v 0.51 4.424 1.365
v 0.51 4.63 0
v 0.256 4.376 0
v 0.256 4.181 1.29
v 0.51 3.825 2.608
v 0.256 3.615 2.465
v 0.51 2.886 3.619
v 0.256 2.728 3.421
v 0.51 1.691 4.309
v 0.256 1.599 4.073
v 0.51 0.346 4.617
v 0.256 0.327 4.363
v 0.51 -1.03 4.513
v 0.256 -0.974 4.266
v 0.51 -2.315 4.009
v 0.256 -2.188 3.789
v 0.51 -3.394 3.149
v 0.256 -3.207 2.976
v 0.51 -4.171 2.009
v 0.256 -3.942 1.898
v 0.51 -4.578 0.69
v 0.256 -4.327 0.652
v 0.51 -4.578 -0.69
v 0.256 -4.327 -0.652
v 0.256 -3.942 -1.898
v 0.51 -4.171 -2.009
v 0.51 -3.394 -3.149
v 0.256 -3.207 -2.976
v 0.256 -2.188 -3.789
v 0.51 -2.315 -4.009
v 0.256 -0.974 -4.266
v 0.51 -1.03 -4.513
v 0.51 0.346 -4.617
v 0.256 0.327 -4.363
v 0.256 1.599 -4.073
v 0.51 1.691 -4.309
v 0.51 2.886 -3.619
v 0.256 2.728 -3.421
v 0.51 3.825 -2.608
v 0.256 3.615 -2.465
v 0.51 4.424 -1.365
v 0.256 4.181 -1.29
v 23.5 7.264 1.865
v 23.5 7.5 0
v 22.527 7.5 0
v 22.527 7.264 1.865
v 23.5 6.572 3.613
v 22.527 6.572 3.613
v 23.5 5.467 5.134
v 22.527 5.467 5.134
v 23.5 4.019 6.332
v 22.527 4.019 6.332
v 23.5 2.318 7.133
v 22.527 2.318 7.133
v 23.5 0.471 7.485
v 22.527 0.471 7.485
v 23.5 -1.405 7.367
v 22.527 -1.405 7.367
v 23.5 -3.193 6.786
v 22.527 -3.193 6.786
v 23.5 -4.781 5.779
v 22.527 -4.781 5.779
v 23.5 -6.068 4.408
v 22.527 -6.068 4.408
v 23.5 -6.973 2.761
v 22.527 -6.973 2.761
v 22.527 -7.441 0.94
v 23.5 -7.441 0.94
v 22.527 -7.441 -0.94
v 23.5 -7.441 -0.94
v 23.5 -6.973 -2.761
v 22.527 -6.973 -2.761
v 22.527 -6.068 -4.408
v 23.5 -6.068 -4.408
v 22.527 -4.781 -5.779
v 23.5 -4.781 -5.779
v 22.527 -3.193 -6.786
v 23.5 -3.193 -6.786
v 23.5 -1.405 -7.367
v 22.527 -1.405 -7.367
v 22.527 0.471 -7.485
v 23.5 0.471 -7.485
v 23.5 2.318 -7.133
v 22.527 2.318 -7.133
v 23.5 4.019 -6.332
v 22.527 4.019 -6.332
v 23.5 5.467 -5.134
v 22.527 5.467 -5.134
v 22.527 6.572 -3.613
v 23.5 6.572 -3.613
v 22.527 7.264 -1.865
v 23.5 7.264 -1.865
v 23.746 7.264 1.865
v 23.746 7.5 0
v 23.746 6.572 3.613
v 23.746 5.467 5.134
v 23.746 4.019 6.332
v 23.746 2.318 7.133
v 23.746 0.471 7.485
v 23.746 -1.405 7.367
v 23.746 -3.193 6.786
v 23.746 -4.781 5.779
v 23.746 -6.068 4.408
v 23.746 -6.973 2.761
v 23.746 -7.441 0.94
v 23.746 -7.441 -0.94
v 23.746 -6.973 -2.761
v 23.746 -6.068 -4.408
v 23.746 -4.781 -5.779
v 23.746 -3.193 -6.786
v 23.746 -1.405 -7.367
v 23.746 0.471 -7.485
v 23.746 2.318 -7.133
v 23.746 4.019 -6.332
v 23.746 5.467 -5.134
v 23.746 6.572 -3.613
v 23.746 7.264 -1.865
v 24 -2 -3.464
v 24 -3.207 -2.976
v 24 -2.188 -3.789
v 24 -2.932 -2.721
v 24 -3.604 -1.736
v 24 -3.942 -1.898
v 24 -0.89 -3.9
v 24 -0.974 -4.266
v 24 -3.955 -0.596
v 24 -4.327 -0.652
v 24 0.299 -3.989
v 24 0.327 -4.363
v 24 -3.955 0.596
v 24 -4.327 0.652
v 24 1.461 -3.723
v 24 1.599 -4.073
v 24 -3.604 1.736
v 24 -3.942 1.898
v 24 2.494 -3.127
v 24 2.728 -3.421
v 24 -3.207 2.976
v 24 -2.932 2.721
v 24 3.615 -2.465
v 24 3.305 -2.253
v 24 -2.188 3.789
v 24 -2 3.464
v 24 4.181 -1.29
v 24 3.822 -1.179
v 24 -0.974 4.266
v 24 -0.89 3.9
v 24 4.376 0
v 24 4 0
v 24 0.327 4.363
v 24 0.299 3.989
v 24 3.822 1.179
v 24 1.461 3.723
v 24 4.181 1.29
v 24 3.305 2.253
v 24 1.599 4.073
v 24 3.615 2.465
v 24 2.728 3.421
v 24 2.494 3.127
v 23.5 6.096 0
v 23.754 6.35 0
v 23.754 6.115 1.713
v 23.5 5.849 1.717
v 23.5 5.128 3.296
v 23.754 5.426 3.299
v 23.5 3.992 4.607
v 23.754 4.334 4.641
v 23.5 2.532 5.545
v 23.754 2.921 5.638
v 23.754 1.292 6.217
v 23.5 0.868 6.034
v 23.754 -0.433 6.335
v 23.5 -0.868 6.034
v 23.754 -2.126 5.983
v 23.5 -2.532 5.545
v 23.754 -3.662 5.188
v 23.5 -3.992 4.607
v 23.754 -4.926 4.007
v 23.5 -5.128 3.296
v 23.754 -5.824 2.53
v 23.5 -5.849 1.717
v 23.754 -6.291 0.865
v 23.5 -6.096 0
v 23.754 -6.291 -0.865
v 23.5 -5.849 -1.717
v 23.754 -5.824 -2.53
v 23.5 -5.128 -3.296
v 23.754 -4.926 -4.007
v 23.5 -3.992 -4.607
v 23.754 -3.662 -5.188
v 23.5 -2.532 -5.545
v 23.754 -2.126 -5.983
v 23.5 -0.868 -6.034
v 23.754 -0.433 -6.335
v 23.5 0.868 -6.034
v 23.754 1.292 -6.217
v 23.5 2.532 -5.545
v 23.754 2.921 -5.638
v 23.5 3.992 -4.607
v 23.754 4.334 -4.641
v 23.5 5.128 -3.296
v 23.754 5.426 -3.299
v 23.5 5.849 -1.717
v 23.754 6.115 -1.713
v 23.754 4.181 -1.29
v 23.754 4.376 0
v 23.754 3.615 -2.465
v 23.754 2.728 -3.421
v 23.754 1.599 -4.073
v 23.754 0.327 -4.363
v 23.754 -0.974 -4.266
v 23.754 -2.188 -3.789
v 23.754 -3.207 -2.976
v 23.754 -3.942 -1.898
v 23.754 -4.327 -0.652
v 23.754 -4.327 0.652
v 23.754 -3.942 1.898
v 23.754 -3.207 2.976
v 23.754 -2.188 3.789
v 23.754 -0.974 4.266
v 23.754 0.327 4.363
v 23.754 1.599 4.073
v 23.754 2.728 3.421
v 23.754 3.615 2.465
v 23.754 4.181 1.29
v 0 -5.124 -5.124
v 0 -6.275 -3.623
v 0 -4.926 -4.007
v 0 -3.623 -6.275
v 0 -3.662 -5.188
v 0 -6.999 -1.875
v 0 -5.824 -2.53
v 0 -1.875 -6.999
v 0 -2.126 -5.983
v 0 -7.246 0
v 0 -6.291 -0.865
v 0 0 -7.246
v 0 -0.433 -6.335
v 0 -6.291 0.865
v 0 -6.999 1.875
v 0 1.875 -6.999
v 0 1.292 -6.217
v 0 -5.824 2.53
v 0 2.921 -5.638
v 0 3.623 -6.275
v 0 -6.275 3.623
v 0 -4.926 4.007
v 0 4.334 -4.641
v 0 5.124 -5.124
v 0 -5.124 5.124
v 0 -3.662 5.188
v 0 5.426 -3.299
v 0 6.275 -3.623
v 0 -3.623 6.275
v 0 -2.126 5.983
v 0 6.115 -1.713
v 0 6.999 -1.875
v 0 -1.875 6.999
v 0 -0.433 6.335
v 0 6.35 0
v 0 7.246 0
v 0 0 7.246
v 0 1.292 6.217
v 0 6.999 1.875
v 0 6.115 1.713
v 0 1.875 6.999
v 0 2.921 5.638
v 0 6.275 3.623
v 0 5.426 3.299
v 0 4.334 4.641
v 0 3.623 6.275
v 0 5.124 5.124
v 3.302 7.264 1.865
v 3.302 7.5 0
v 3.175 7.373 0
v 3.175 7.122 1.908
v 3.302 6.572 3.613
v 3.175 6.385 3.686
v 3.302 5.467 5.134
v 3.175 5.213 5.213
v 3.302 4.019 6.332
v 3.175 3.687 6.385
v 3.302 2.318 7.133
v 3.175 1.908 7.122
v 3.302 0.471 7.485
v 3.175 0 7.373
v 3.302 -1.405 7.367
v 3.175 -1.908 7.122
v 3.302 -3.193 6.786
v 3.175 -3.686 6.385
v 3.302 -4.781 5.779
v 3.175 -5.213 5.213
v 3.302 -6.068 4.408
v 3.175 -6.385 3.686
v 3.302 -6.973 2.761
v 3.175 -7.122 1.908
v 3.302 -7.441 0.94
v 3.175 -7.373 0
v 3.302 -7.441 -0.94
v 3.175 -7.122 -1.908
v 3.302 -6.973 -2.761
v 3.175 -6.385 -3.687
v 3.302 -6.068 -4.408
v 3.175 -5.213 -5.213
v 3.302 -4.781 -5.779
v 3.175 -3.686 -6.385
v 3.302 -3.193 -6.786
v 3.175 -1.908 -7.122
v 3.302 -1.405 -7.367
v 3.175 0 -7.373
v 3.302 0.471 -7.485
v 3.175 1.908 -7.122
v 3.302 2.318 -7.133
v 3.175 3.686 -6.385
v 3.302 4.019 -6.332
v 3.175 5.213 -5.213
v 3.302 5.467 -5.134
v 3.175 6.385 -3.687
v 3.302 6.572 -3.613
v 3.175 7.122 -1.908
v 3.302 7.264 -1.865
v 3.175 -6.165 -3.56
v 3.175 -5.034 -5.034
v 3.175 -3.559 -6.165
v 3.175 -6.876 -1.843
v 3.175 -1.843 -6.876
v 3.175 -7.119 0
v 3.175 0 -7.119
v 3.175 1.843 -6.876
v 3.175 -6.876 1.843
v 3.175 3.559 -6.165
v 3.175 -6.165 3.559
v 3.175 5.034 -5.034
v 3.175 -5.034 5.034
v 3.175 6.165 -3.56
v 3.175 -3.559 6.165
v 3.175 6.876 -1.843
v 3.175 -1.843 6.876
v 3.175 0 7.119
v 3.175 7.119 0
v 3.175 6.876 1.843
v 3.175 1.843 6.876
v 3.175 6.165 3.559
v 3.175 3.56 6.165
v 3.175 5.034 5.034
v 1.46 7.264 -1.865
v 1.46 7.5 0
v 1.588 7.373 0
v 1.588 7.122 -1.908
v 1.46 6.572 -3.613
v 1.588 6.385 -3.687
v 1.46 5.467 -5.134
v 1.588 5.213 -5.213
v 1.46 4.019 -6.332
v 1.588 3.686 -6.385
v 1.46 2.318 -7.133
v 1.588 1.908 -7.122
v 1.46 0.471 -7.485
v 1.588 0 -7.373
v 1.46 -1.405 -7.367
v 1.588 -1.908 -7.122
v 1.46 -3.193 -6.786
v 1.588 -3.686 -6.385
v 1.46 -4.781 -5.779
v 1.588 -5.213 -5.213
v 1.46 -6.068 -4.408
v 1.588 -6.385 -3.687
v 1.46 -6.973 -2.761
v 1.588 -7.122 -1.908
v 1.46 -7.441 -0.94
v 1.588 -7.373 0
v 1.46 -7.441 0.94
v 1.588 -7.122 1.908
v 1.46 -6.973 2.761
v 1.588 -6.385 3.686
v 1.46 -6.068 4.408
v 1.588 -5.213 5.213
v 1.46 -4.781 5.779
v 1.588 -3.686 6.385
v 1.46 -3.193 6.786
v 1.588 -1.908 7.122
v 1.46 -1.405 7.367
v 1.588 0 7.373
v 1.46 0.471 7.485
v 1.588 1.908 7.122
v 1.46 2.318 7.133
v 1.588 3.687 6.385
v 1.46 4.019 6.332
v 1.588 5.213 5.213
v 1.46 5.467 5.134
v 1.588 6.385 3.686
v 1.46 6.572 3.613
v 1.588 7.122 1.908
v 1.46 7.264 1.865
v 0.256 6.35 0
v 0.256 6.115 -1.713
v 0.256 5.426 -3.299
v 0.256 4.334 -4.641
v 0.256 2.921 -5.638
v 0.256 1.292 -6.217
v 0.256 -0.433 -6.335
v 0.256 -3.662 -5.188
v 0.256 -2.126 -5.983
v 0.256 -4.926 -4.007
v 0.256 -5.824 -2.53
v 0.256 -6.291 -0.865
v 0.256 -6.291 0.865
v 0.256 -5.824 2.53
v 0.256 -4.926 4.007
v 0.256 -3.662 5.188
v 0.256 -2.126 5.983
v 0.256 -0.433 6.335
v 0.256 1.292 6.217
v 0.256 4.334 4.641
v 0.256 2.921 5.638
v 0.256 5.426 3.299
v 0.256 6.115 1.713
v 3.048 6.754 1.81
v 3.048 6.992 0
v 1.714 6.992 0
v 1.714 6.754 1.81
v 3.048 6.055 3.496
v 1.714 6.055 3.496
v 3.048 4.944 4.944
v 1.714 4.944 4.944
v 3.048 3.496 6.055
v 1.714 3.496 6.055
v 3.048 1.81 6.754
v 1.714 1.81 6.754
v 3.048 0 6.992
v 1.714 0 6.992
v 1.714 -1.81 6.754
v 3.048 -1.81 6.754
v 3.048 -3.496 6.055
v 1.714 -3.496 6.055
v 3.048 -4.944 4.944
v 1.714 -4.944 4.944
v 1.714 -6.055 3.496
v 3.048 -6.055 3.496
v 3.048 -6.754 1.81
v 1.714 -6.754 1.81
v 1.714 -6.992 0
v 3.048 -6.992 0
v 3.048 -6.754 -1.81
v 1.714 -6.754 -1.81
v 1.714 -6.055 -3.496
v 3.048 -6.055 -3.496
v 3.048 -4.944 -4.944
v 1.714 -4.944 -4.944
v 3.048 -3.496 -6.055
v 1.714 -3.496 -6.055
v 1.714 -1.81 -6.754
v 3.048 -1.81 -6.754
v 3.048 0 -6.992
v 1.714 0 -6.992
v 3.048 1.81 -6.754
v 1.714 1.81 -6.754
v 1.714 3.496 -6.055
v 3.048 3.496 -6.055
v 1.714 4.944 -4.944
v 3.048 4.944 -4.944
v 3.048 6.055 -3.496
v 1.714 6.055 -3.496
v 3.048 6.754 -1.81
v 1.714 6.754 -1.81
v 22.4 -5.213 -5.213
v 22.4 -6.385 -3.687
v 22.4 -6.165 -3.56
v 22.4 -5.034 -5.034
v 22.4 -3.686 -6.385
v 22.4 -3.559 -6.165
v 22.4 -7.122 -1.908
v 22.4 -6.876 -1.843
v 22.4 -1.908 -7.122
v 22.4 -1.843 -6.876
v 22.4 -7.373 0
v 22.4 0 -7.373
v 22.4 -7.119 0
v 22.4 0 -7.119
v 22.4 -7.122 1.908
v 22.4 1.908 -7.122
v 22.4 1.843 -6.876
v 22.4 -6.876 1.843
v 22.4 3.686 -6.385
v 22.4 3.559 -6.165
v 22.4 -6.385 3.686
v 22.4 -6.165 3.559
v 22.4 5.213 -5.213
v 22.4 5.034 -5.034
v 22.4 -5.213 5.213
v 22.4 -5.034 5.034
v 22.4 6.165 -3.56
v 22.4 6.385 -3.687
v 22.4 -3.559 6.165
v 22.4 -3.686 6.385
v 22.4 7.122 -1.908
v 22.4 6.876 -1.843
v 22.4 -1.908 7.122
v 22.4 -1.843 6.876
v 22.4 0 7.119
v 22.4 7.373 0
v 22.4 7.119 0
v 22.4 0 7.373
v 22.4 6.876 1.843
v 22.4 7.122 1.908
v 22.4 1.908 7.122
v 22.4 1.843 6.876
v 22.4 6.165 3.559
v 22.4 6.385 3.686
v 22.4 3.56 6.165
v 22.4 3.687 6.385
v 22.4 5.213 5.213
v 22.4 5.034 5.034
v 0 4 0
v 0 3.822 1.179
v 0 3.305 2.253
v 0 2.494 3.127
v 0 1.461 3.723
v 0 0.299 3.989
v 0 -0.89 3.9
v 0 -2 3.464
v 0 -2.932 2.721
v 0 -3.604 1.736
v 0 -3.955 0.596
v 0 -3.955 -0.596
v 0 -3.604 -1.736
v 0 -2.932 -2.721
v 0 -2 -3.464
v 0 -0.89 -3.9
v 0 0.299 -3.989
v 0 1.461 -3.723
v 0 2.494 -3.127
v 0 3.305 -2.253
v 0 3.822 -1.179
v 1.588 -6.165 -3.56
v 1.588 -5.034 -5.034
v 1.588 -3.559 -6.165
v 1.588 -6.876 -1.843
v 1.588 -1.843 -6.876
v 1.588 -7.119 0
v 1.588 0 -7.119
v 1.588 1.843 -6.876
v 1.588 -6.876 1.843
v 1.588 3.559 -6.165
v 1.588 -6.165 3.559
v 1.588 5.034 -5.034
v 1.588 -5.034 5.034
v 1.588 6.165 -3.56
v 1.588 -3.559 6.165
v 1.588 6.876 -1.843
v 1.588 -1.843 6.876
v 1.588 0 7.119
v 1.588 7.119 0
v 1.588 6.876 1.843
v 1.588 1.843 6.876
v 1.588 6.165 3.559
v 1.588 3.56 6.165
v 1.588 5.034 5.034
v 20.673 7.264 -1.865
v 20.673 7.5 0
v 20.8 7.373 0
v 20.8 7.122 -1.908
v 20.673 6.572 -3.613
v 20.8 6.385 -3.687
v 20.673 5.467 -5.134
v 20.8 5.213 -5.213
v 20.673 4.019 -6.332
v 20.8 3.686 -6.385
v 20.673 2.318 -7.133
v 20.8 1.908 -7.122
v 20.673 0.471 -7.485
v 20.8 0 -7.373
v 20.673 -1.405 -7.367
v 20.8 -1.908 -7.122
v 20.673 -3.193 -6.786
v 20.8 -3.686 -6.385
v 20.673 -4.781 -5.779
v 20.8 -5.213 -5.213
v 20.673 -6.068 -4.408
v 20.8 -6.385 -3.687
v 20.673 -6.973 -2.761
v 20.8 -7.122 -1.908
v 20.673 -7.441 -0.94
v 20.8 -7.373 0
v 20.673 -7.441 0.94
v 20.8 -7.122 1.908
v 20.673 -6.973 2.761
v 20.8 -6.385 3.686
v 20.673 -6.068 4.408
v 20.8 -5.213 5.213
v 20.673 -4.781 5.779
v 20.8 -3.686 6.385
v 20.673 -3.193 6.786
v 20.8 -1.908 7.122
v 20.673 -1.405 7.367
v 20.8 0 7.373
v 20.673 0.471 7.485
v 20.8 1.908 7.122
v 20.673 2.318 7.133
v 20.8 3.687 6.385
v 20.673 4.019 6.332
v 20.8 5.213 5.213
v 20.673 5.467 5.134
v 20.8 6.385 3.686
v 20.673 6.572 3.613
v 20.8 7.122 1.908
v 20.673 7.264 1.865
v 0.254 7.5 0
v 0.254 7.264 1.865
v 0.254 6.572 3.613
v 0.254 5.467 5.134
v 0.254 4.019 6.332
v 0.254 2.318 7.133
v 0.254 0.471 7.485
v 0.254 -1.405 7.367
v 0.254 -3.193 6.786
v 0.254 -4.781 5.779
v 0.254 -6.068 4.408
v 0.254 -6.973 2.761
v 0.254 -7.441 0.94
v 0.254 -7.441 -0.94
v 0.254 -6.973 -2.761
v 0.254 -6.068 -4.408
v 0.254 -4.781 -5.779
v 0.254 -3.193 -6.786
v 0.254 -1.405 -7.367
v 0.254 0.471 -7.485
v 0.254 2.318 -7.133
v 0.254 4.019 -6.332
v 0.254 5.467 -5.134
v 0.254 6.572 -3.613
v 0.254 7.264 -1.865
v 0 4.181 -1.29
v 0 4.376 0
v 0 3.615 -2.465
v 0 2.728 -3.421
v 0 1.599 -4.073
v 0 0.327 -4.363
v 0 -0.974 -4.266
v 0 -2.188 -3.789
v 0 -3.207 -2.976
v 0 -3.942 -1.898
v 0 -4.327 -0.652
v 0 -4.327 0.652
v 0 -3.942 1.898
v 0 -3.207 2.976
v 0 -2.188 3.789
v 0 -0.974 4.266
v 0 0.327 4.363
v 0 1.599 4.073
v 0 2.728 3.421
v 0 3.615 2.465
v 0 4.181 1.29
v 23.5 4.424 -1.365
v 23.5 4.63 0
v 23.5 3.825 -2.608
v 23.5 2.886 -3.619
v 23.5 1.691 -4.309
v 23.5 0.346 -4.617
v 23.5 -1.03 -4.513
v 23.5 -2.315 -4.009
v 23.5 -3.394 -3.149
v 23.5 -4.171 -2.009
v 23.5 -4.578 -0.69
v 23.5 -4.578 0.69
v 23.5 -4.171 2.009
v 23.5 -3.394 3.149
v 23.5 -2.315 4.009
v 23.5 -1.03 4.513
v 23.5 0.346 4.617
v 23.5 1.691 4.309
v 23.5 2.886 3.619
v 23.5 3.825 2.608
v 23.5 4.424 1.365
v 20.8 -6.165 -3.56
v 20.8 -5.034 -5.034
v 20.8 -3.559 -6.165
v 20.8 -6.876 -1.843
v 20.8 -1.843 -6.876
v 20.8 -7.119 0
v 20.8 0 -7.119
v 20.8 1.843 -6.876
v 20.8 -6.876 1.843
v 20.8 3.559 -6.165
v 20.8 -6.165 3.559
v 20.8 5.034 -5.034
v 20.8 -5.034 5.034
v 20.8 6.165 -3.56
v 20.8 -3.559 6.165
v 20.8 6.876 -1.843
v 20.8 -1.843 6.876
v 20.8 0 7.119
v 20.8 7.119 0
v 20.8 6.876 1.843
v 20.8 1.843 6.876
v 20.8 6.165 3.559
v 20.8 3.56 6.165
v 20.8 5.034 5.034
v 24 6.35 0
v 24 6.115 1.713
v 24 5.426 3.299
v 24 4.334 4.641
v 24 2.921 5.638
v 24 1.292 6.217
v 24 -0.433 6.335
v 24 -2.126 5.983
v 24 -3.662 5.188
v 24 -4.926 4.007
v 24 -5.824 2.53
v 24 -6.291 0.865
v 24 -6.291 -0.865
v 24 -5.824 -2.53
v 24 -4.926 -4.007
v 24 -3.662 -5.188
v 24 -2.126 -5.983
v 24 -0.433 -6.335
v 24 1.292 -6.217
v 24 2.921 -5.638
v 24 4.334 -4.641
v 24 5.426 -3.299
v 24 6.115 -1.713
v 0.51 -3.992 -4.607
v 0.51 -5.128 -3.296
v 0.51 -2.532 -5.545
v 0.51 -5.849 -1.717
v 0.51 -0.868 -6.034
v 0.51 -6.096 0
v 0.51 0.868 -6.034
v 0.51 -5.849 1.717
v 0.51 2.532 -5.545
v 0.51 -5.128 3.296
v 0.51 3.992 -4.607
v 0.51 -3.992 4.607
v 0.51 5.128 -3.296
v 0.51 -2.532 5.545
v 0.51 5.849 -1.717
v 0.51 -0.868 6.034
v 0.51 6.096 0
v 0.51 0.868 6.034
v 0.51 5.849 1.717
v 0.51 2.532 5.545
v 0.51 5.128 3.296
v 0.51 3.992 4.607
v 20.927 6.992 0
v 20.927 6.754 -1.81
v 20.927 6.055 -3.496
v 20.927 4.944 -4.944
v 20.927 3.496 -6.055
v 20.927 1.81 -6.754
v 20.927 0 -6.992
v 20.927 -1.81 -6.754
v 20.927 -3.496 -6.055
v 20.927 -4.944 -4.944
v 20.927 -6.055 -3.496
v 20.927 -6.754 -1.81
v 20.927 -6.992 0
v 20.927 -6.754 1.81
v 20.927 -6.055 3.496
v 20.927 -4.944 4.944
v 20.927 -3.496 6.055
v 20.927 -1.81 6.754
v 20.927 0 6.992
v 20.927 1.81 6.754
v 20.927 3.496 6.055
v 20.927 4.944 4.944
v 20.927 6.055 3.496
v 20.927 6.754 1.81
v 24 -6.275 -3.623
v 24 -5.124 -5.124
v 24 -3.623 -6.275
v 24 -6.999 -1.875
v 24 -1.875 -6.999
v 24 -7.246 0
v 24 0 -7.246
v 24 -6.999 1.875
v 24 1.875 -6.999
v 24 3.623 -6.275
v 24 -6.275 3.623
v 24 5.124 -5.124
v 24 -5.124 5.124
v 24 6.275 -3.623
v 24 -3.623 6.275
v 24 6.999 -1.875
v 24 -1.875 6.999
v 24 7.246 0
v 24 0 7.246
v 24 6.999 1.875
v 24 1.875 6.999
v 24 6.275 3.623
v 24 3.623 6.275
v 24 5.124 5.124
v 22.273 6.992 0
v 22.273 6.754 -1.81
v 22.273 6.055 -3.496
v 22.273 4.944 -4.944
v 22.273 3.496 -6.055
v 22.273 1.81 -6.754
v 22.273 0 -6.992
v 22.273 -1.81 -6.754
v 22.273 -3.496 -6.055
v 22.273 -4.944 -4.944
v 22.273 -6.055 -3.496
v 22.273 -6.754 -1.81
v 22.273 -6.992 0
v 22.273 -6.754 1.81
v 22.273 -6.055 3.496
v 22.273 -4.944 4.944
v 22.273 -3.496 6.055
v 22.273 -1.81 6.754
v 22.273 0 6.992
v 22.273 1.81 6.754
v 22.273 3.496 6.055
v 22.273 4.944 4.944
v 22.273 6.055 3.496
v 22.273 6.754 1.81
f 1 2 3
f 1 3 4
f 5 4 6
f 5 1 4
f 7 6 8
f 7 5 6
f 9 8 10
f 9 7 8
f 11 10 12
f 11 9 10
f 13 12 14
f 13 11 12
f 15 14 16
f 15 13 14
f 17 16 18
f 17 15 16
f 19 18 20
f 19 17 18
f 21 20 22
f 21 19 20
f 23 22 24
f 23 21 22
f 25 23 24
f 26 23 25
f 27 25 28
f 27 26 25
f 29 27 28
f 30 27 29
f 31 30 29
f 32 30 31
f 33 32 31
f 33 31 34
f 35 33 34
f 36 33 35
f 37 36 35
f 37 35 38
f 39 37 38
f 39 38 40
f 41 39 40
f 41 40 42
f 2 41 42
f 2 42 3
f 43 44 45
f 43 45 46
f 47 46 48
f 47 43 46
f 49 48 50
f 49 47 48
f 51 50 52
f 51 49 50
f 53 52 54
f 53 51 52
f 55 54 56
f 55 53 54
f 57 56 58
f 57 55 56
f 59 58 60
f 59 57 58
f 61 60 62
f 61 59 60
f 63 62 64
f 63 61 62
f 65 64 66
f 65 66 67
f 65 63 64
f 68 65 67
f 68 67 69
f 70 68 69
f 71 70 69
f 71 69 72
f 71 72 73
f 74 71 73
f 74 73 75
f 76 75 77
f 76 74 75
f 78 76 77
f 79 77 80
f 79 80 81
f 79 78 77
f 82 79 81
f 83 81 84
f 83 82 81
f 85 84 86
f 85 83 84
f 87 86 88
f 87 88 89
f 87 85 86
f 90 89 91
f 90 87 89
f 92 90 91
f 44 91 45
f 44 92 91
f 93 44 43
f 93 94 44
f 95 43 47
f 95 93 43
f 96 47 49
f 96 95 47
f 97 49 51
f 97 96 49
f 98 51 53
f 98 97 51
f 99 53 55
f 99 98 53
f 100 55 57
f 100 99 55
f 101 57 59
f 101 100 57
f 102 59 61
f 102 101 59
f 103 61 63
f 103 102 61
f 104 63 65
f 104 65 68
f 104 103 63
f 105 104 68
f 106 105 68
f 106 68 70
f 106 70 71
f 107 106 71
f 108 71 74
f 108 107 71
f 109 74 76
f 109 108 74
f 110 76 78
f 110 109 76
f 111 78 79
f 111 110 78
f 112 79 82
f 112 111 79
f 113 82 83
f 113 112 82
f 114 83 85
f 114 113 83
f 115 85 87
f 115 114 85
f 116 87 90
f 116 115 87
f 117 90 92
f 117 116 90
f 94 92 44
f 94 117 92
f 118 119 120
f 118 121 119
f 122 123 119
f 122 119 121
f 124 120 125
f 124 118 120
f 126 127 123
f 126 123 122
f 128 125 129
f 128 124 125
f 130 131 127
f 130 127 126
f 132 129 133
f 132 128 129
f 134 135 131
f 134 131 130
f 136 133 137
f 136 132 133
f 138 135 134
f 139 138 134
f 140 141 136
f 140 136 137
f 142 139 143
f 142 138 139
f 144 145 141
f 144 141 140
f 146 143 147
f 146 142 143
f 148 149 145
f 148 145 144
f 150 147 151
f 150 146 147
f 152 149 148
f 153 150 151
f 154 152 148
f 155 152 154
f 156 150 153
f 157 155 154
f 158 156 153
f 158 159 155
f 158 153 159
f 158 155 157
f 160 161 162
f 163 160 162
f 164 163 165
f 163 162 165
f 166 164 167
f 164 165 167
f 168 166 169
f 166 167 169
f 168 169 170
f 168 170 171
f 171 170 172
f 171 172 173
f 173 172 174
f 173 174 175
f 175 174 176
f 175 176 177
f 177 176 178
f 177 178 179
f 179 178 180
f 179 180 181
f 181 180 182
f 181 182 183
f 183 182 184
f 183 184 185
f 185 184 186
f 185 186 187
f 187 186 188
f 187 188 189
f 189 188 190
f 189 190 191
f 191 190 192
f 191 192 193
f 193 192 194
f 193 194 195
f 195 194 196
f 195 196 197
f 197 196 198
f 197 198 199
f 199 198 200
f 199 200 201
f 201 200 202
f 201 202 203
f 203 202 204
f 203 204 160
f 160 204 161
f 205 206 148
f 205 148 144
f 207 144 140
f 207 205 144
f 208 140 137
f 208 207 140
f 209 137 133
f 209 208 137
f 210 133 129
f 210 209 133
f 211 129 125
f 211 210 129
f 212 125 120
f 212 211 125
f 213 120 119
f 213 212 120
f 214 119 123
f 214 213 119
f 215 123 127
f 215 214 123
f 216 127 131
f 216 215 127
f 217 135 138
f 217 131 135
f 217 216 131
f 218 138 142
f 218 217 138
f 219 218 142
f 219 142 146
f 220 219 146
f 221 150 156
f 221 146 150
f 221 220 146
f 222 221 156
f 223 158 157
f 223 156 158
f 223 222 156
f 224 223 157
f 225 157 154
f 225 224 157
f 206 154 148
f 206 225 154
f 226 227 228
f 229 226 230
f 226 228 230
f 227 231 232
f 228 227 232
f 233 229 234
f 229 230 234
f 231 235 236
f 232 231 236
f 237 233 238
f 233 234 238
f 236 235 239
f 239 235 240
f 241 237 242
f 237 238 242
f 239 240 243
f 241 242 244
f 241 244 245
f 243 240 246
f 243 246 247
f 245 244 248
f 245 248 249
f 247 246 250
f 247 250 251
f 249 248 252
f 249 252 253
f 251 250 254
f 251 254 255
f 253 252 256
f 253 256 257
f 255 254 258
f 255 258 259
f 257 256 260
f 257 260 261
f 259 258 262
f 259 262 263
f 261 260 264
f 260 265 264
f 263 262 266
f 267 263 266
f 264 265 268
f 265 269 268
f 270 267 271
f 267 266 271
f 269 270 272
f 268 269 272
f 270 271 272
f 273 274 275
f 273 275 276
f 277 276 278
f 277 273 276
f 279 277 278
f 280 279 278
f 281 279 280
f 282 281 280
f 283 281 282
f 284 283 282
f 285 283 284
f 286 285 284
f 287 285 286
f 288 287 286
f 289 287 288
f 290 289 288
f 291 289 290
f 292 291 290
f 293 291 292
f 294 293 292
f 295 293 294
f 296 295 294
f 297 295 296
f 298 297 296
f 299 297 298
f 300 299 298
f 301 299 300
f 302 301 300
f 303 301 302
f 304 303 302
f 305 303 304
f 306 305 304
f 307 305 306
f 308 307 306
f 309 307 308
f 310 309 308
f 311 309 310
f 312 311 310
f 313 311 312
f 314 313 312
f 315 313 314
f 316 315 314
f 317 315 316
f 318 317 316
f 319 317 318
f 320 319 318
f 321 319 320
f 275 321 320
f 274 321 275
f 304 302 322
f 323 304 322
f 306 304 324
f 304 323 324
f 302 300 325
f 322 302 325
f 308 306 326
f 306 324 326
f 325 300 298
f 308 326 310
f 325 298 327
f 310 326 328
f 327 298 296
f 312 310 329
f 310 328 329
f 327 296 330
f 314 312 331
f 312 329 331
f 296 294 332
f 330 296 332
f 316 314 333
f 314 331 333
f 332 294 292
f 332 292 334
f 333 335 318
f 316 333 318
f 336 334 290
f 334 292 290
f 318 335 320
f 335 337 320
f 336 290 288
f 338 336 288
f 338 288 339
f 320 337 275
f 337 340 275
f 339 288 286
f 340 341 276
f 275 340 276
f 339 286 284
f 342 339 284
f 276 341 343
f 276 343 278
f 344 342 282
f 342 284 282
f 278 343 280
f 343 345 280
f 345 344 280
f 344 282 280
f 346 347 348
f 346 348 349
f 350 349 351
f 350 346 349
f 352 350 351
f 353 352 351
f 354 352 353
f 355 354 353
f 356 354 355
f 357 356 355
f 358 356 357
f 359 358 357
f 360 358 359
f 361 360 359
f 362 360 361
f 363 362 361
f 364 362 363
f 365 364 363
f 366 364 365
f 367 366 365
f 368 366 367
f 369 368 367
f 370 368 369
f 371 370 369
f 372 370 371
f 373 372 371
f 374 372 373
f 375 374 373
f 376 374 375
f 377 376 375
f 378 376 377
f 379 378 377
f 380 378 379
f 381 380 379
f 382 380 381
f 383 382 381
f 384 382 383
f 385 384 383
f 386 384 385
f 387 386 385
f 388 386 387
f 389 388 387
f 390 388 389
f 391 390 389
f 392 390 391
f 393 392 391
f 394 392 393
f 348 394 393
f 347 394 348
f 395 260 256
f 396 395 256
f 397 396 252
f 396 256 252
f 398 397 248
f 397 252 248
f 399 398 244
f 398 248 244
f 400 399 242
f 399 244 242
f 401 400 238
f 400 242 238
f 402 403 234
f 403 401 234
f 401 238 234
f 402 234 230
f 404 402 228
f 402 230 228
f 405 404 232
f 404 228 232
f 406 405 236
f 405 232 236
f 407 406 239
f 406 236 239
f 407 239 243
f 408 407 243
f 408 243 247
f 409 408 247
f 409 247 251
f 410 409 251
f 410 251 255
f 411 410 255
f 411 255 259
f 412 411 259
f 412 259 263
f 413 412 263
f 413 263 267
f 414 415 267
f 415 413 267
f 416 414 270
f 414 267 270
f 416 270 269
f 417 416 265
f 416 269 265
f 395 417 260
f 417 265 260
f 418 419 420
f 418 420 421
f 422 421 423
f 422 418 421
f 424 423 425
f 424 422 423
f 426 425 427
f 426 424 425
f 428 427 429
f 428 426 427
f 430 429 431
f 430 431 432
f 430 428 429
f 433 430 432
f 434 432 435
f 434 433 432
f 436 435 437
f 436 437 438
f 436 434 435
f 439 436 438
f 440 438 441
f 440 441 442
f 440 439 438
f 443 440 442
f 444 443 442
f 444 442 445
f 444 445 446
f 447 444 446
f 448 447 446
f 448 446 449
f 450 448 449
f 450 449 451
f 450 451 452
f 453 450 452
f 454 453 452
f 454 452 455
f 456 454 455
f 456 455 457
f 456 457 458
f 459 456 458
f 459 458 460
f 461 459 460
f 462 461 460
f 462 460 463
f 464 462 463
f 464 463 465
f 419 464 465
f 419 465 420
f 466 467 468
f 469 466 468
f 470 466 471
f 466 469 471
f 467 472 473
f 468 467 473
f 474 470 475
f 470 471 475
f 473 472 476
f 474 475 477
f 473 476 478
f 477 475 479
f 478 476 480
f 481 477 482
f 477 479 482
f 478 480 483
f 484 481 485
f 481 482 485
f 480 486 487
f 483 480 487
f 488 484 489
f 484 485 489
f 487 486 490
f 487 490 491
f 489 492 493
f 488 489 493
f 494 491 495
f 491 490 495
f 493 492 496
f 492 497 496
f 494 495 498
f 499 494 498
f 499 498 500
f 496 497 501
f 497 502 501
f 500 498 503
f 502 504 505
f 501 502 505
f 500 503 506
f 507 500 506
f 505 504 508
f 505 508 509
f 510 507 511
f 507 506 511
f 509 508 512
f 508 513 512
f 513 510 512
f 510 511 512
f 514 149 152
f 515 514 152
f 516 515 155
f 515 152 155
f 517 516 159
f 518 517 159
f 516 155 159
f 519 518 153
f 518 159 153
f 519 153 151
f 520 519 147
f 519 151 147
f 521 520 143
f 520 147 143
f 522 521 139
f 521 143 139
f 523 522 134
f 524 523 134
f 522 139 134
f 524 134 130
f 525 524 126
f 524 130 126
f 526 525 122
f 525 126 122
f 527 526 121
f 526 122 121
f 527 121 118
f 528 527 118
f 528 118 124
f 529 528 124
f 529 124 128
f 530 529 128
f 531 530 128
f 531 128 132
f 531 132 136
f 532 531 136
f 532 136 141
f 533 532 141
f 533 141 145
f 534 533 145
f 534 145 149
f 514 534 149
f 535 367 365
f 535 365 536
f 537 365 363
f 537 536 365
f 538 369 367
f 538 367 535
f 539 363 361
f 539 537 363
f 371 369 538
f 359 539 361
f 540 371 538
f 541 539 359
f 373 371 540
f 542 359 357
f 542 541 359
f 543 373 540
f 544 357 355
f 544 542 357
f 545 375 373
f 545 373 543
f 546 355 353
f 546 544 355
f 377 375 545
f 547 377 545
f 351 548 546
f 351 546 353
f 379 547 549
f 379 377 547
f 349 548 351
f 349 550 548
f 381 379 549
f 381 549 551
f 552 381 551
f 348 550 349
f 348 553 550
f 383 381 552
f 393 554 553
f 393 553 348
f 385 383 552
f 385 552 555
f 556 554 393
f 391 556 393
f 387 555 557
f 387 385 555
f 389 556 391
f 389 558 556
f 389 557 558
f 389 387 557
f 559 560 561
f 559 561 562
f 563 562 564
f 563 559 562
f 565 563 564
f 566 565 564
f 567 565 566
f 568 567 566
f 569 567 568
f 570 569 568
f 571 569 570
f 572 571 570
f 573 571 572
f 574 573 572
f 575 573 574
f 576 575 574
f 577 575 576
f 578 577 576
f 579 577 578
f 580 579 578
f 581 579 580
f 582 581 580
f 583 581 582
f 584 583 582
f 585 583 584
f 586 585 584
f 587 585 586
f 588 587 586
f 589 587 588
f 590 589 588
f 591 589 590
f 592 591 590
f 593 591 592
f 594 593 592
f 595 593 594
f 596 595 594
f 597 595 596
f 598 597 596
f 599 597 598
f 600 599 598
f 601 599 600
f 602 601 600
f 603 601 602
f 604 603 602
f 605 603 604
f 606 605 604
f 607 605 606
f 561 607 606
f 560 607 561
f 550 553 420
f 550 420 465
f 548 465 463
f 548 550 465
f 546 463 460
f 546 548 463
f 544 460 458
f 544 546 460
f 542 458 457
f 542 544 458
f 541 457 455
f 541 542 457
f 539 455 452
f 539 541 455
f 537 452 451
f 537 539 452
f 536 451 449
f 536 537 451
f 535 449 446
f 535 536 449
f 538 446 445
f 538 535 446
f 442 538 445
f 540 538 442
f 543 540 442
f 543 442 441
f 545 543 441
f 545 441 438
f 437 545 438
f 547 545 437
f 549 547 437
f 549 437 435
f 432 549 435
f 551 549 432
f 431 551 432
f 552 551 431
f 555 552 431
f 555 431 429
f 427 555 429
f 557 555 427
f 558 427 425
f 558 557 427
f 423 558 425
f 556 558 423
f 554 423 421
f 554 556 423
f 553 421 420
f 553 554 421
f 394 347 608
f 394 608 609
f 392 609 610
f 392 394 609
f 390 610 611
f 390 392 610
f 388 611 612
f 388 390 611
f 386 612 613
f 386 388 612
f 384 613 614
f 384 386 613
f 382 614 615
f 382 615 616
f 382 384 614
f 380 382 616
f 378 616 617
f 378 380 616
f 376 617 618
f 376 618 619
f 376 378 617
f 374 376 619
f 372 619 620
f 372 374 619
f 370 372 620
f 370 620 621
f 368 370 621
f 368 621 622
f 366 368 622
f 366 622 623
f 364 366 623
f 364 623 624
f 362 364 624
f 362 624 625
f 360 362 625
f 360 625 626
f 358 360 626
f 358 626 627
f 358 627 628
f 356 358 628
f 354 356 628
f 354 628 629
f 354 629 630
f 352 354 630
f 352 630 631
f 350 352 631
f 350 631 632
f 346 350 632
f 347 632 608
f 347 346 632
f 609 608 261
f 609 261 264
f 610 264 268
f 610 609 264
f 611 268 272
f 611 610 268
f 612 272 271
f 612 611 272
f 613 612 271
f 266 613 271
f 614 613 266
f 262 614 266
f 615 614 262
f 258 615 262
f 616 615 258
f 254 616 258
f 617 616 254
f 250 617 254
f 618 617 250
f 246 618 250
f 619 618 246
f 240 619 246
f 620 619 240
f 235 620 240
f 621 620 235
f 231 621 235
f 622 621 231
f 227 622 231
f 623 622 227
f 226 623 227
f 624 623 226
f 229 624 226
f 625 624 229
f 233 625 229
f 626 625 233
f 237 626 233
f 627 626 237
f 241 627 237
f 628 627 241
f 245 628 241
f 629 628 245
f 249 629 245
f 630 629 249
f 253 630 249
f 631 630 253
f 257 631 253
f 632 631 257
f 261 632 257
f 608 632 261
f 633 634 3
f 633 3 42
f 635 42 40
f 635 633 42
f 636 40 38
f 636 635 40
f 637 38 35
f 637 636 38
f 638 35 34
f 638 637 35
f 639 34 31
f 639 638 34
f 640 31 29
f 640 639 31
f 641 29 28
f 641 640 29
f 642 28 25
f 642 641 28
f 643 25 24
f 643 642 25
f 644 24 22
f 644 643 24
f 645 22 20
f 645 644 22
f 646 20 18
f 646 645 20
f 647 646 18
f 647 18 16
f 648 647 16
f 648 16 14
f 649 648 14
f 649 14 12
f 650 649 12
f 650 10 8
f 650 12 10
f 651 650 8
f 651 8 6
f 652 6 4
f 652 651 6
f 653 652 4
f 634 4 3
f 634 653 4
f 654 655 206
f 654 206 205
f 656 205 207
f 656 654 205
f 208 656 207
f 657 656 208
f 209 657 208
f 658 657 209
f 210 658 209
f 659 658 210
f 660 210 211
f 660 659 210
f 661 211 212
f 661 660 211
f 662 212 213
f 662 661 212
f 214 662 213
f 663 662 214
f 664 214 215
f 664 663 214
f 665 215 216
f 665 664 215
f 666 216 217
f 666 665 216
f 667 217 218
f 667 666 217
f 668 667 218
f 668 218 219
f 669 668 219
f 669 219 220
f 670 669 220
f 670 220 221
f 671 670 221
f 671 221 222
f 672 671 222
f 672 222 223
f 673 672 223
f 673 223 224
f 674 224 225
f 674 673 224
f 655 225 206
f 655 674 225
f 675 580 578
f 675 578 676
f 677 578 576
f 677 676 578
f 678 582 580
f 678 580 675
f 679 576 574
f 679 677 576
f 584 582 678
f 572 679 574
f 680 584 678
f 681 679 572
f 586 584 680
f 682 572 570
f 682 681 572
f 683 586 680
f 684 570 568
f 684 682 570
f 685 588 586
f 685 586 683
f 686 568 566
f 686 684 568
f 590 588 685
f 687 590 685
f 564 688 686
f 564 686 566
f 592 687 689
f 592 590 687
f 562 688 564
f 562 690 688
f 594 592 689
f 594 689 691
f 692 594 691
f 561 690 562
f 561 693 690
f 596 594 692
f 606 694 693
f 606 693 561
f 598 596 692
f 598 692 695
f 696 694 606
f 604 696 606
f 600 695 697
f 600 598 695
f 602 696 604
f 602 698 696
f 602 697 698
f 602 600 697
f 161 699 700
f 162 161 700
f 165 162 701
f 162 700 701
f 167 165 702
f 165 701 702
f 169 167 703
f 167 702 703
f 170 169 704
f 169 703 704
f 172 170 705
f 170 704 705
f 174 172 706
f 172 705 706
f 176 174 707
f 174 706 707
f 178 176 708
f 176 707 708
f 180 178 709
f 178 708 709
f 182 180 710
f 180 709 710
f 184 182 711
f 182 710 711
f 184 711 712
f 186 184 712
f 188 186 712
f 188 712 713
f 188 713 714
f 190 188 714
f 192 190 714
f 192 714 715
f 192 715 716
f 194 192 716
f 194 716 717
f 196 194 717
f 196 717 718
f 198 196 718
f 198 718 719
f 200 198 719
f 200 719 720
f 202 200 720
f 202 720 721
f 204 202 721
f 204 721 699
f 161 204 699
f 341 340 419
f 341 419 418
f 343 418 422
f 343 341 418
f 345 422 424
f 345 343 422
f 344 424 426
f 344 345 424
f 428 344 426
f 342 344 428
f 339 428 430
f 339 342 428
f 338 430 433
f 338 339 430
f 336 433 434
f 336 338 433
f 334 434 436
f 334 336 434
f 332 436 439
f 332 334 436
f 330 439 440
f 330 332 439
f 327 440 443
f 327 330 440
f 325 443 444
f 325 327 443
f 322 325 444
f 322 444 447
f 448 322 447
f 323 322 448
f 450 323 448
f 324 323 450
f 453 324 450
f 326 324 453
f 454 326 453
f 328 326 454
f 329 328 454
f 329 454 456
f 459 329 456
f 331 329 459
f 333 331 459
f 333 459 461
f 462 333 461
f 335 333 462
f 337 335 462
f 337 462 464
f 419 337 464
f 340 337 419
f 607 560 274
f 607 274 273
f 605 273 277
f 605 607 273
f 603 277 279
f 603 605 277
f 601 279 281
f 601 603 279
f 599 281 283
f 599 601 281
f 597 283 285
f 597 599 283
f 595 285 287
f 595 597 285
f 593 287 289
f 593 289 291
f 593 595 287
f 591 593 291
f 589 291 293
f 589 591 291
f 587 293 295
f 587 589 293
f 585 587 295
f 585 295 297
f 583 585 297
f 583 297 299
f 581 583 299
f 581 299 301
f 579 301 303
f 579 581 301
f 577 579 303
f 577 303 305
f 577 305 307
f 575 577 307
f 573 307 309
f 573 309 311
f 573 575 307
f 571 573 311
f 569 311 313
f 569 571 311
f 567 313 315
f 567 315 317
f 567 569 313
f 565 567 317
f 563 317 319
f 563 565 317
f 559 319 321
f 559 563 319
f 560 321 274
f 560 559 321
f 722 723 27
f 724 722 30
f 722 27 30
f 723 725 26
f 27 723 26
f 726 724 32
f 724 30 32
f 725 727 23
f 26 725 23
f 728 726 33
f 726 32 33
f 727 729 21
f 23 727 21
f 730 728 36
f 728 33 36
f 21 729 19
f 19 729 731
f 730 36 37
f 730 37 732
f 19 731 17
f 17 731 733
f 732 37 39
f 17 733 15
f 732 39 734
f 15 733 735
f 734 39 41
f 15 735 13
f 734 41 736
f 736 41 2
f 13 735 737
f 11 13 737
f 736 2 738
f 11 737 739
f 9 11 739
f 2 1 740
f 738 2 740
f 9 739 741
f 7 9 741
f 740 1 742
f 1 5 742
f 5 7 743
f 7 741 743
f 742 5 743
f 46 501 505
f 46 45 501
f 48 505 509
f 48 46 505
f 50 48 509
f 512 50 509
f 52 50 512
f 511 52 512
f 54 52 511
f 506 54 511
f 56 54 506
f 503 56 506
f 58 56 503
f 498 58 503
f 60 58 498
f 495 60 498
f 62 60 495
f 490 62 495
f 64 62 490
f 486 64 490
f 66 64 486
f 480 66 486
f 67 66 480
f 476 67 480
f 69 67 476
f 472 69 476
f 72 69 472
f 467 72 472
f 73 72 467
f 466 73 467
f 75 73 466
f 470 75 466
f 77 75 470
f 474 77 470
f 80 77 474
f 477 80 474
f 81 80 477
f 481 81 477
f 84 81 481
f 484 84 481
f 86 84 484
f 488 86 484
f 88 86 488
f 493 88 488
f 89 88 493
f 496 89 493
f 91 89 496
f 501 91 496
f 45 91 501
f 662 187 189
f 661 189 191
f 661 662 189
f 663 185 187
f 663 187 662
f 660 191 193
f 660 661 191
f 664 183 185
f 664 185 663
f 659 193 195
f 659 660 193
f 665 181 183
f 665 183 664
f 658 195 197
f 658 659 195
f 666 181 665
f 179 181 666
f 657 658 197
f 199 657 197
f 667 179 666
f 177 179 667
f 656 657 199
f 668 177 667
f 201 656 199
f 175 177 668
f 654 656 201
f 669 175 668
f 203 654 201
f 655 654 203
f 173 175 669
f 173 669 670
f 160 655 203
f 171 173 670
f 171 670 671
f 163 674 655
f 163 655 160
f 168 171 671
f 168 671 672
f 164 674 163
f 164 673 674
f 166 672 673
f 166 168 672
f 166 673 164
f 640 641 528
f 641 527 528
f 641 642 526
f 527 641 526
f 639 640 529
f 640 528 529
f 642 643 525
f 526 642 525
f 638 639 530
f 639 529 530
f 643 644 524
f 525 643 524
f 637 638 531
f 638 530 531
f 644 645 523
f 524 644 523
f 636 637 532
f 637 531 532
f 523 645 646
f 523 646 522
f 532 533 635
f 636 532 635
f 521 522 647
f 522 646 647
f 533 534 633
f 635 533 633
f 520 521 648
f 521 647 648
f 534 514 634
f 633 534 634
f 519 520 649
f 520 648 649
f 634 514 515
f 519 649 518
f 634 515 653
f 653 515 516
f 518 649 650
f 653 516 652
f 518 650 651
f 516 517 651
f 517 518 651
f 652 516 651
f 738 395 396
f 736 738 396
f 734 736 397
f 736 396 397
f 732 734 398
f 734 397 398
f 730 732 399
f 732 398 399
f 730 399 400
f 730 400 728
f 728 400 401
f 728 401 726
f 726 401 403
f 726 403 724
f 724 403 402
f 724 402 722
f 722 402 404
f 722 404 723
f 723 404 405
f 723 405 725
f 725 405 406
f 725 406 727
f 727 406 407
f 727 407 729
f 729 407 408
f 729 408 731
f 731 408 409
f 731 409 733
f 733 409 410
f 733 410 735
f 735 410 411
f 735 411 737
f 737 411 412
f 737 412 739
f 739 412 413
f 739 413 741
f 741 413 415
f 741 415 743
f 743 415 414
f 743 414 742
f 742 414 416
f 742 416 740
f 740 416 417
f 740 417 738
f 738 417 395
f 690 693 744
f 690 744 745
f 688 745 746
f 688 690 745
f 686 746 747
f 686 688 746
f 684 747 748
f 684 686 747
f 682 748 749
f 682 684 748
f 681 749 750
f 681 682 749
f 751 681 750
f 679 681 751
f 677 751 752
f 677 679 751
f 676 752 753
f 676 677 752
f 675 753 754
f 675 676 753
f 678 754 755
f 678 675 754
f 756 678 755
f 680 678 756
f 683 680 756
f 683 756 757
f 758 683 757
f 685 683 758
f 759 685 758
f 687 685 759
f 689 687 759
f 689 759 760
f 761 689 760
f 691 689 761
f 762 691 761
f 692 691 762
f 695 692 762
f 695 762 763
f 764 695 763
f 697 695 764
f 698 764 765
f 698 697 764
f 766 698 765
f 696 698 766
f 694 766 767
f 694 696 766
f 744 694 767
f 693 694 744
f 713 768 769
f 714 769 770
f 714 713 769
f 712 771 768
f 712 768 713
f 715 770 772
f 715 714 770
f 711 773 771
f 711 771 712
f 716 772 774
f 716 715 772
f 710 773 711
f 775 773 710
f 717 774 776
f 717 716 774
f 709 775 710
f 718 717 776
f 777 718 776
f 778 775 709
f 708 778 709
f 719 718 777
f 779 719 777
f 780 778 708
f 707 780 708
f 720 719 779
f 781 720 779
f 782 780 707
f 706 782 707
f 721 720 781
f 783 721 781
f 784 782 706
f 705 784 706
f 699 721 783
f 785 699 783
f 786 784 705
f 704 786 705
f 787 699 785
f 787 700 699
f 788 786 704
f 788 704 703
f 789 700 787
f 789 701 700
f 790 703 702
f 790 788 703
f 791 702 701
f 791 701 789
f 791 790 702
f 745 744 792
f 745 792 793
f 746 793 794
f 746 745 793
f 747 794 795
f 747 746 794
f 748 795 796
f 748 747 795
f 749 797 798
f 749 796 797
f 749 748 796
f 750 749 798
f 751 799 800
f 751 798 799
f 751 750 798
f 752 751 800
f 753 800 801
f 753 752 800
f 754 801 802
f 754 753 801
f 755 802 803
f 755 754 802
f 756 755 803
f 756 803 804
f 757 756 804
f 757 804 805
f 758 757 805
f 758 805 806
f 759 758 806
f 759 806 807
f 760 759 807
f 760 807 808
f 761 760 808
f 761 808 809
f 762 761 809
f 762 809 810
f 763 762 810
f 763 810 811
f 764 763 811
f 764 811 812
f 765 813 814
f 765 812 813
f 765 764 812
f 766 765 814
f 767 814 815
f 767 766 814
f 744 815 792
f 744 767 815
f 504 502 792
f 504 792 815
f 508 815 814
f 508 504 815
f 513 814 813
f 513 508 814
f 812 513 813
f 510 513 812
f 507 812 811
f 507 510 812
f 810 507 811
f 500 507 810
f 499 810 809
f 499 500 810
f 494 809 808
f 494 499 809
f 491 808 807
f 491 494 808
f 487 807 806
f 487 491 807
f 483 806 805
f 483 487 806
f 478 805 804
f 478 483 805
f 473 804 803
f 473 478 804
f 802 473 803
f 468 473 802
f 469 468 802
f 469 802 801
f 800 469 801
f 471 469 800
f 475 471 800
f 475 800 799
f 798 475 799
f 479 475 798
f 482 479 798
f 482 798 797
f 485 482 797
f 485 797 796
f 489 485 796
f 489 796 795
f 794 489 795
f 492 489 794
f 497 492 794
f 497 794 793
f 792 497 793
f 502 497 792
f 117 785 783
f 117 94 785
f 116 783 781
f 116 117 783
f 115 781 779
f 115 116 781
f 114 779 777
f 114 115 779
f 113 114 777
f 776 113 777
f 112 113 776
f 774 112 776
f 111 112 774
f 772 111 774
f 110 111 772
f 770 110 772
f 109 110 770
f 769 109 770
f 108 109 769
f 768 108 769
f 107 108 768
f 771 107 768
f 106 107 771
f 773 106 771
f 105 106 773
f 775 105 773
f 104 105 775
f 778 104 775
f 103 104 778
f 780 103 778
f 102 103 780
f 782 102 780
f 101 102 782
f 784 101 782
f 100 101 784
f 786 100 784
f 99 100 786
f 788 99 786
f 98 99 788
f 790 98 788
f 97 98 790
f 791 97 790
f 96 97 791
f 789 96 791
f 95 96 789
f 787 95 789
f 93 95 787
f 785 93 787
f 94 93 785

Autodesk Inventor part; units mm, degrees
ref_plane "YZ Plane" through (0, 0, 0) normal (1, 0, 0) x (0, 1, 0)
ref_plane "XZ Plane" through (0, 0, 0) normal (0, 1, 0) x (-1, 0, 0)
ref_plane "XY Plane" through (0, 0, 0) normal (0, 0, 1) x (1, 0, 0)
sketch "Sketch1" plane through (0, 0, 0) normal (0, 0, 1) x (1, 0, 0)
  line L0 (0, 0) -> (23.5, 0)
  line L1 (0, 0) -> (0, 4) construction
  line L2 (0, 4) -> (23.5, 4) construction
  line L3 (0, 0) -> (0, 7.5) construction
  line L4 (0, 7.5) -> (23.5, 7.5) construction
  line L5 (23.5, 7.5) -> (23.5, 0) construction
  line L6 (0, 7.5) -> (23.5, 7.5)
  line L7 (1.5875, 7.5) -> (1.5875, 6.992)
  line L8 (1.5875, 6.992) -> (3.175, 6.992)
  line L9 (3.175, 6.992) -> (3.175, 7.5)
  line L10 (0, 7.5) -> (24, 7.5)
  line L11 (0, 4) -> (24, 4)
  line L12 (24, 4) -> (24, 4.3755)
  line L13 (24, 4.3755) -> (23.5, 4.3755)
  line L14 (23.5, 6.35) -> (24, 6.35)
  line L15 (24, 6.35) -> (24, 7.5)
  line L16 (0, 7.5) -> (0, 6.35)
  line L17 (0, 4) -> (0, 4.3755)
  line L18 (0.5103, 4.3755) -> (0, 4.3755)
  line L19 (0.5103, 4.3755) -> (0.5103, 6.35)
  line L20 (0.5103, 6.35) -> (0, 6.35)
  line L21 (24, 7.5) -> (22.3998, 7.5)
  line L22 (22.3998, 7.5) -> (22.3998, 6.992)
  line L23 (22.3998, 6.992) -> (20.7996, 6.992)
  line L24 (20.7996, 6.992) -> (20.7996, 7.5)
  line L25 (0, 7.5) -> (0, 6.35)
  line L26 (0, 6.35) -> (0.5103, 6.35)
  line L27 (0.5103, 6.35) -> (0.5103, 4.3755)
  line L28 (0, 4) -> (24, 4)
  line L29 (23.5, 6.35) -> (23.5, 4.3755)
  line L30 (22.3998, 7.5) -> (24, 7.5)
  line L31 (24, 7.5) -> (24, 6.35)
  line L32 (22.3998, 7.5) -> (22.3998, 6.992)
  line L33 (22.3998, 6.992) -> (20.7996, 6.992)
  line L34 (20.7996, 6.992) -> (20.7996, 7.5)
  dimension "d0" = 23.5
  dimension "d1" = 4
  dimension "d2" = 7.5
  dimension "d3" = 0.508
  dimension "d4" = 24
  dimension "d5" = 24
  dimension "d6" = 1.6002
  dimension "d7" = 1.6002
revolve "Revolution1" add sketch "Sketch1" angle 360 about axis through (0, 0, 0) along (1, 0, 0) contours L6 L7 L8 L9 L24 L23 L22 L10 L15 L14 L29 L13 L12 L11 L17 L18 L19 L20 L16
chamfer "Chamfer1" distance 0.254 angle 45 6 edges at (24, -7.5, 0) (0, -7.5, 0) (23.5, -4.3755, 0) (23.5, -6.35, 0) (0.5103, -6.35, 0) (0.5103, -4.3755, 0)
chamfer "Chamfer2" distance 0.127 angle 45 8 edges at (3.175, -7.5, 0) (3.175, -6.992, 0) (22.3998, -7.5, 0) (22.3998, -6.992, 0) (1.5875, -6.992, 0) (20.7996, -6.992, 0) (20.7996, -7.5, 0) (1.5875, -7.5, 0)
properties part number "LM8UU 8mm Linear Bearing"
